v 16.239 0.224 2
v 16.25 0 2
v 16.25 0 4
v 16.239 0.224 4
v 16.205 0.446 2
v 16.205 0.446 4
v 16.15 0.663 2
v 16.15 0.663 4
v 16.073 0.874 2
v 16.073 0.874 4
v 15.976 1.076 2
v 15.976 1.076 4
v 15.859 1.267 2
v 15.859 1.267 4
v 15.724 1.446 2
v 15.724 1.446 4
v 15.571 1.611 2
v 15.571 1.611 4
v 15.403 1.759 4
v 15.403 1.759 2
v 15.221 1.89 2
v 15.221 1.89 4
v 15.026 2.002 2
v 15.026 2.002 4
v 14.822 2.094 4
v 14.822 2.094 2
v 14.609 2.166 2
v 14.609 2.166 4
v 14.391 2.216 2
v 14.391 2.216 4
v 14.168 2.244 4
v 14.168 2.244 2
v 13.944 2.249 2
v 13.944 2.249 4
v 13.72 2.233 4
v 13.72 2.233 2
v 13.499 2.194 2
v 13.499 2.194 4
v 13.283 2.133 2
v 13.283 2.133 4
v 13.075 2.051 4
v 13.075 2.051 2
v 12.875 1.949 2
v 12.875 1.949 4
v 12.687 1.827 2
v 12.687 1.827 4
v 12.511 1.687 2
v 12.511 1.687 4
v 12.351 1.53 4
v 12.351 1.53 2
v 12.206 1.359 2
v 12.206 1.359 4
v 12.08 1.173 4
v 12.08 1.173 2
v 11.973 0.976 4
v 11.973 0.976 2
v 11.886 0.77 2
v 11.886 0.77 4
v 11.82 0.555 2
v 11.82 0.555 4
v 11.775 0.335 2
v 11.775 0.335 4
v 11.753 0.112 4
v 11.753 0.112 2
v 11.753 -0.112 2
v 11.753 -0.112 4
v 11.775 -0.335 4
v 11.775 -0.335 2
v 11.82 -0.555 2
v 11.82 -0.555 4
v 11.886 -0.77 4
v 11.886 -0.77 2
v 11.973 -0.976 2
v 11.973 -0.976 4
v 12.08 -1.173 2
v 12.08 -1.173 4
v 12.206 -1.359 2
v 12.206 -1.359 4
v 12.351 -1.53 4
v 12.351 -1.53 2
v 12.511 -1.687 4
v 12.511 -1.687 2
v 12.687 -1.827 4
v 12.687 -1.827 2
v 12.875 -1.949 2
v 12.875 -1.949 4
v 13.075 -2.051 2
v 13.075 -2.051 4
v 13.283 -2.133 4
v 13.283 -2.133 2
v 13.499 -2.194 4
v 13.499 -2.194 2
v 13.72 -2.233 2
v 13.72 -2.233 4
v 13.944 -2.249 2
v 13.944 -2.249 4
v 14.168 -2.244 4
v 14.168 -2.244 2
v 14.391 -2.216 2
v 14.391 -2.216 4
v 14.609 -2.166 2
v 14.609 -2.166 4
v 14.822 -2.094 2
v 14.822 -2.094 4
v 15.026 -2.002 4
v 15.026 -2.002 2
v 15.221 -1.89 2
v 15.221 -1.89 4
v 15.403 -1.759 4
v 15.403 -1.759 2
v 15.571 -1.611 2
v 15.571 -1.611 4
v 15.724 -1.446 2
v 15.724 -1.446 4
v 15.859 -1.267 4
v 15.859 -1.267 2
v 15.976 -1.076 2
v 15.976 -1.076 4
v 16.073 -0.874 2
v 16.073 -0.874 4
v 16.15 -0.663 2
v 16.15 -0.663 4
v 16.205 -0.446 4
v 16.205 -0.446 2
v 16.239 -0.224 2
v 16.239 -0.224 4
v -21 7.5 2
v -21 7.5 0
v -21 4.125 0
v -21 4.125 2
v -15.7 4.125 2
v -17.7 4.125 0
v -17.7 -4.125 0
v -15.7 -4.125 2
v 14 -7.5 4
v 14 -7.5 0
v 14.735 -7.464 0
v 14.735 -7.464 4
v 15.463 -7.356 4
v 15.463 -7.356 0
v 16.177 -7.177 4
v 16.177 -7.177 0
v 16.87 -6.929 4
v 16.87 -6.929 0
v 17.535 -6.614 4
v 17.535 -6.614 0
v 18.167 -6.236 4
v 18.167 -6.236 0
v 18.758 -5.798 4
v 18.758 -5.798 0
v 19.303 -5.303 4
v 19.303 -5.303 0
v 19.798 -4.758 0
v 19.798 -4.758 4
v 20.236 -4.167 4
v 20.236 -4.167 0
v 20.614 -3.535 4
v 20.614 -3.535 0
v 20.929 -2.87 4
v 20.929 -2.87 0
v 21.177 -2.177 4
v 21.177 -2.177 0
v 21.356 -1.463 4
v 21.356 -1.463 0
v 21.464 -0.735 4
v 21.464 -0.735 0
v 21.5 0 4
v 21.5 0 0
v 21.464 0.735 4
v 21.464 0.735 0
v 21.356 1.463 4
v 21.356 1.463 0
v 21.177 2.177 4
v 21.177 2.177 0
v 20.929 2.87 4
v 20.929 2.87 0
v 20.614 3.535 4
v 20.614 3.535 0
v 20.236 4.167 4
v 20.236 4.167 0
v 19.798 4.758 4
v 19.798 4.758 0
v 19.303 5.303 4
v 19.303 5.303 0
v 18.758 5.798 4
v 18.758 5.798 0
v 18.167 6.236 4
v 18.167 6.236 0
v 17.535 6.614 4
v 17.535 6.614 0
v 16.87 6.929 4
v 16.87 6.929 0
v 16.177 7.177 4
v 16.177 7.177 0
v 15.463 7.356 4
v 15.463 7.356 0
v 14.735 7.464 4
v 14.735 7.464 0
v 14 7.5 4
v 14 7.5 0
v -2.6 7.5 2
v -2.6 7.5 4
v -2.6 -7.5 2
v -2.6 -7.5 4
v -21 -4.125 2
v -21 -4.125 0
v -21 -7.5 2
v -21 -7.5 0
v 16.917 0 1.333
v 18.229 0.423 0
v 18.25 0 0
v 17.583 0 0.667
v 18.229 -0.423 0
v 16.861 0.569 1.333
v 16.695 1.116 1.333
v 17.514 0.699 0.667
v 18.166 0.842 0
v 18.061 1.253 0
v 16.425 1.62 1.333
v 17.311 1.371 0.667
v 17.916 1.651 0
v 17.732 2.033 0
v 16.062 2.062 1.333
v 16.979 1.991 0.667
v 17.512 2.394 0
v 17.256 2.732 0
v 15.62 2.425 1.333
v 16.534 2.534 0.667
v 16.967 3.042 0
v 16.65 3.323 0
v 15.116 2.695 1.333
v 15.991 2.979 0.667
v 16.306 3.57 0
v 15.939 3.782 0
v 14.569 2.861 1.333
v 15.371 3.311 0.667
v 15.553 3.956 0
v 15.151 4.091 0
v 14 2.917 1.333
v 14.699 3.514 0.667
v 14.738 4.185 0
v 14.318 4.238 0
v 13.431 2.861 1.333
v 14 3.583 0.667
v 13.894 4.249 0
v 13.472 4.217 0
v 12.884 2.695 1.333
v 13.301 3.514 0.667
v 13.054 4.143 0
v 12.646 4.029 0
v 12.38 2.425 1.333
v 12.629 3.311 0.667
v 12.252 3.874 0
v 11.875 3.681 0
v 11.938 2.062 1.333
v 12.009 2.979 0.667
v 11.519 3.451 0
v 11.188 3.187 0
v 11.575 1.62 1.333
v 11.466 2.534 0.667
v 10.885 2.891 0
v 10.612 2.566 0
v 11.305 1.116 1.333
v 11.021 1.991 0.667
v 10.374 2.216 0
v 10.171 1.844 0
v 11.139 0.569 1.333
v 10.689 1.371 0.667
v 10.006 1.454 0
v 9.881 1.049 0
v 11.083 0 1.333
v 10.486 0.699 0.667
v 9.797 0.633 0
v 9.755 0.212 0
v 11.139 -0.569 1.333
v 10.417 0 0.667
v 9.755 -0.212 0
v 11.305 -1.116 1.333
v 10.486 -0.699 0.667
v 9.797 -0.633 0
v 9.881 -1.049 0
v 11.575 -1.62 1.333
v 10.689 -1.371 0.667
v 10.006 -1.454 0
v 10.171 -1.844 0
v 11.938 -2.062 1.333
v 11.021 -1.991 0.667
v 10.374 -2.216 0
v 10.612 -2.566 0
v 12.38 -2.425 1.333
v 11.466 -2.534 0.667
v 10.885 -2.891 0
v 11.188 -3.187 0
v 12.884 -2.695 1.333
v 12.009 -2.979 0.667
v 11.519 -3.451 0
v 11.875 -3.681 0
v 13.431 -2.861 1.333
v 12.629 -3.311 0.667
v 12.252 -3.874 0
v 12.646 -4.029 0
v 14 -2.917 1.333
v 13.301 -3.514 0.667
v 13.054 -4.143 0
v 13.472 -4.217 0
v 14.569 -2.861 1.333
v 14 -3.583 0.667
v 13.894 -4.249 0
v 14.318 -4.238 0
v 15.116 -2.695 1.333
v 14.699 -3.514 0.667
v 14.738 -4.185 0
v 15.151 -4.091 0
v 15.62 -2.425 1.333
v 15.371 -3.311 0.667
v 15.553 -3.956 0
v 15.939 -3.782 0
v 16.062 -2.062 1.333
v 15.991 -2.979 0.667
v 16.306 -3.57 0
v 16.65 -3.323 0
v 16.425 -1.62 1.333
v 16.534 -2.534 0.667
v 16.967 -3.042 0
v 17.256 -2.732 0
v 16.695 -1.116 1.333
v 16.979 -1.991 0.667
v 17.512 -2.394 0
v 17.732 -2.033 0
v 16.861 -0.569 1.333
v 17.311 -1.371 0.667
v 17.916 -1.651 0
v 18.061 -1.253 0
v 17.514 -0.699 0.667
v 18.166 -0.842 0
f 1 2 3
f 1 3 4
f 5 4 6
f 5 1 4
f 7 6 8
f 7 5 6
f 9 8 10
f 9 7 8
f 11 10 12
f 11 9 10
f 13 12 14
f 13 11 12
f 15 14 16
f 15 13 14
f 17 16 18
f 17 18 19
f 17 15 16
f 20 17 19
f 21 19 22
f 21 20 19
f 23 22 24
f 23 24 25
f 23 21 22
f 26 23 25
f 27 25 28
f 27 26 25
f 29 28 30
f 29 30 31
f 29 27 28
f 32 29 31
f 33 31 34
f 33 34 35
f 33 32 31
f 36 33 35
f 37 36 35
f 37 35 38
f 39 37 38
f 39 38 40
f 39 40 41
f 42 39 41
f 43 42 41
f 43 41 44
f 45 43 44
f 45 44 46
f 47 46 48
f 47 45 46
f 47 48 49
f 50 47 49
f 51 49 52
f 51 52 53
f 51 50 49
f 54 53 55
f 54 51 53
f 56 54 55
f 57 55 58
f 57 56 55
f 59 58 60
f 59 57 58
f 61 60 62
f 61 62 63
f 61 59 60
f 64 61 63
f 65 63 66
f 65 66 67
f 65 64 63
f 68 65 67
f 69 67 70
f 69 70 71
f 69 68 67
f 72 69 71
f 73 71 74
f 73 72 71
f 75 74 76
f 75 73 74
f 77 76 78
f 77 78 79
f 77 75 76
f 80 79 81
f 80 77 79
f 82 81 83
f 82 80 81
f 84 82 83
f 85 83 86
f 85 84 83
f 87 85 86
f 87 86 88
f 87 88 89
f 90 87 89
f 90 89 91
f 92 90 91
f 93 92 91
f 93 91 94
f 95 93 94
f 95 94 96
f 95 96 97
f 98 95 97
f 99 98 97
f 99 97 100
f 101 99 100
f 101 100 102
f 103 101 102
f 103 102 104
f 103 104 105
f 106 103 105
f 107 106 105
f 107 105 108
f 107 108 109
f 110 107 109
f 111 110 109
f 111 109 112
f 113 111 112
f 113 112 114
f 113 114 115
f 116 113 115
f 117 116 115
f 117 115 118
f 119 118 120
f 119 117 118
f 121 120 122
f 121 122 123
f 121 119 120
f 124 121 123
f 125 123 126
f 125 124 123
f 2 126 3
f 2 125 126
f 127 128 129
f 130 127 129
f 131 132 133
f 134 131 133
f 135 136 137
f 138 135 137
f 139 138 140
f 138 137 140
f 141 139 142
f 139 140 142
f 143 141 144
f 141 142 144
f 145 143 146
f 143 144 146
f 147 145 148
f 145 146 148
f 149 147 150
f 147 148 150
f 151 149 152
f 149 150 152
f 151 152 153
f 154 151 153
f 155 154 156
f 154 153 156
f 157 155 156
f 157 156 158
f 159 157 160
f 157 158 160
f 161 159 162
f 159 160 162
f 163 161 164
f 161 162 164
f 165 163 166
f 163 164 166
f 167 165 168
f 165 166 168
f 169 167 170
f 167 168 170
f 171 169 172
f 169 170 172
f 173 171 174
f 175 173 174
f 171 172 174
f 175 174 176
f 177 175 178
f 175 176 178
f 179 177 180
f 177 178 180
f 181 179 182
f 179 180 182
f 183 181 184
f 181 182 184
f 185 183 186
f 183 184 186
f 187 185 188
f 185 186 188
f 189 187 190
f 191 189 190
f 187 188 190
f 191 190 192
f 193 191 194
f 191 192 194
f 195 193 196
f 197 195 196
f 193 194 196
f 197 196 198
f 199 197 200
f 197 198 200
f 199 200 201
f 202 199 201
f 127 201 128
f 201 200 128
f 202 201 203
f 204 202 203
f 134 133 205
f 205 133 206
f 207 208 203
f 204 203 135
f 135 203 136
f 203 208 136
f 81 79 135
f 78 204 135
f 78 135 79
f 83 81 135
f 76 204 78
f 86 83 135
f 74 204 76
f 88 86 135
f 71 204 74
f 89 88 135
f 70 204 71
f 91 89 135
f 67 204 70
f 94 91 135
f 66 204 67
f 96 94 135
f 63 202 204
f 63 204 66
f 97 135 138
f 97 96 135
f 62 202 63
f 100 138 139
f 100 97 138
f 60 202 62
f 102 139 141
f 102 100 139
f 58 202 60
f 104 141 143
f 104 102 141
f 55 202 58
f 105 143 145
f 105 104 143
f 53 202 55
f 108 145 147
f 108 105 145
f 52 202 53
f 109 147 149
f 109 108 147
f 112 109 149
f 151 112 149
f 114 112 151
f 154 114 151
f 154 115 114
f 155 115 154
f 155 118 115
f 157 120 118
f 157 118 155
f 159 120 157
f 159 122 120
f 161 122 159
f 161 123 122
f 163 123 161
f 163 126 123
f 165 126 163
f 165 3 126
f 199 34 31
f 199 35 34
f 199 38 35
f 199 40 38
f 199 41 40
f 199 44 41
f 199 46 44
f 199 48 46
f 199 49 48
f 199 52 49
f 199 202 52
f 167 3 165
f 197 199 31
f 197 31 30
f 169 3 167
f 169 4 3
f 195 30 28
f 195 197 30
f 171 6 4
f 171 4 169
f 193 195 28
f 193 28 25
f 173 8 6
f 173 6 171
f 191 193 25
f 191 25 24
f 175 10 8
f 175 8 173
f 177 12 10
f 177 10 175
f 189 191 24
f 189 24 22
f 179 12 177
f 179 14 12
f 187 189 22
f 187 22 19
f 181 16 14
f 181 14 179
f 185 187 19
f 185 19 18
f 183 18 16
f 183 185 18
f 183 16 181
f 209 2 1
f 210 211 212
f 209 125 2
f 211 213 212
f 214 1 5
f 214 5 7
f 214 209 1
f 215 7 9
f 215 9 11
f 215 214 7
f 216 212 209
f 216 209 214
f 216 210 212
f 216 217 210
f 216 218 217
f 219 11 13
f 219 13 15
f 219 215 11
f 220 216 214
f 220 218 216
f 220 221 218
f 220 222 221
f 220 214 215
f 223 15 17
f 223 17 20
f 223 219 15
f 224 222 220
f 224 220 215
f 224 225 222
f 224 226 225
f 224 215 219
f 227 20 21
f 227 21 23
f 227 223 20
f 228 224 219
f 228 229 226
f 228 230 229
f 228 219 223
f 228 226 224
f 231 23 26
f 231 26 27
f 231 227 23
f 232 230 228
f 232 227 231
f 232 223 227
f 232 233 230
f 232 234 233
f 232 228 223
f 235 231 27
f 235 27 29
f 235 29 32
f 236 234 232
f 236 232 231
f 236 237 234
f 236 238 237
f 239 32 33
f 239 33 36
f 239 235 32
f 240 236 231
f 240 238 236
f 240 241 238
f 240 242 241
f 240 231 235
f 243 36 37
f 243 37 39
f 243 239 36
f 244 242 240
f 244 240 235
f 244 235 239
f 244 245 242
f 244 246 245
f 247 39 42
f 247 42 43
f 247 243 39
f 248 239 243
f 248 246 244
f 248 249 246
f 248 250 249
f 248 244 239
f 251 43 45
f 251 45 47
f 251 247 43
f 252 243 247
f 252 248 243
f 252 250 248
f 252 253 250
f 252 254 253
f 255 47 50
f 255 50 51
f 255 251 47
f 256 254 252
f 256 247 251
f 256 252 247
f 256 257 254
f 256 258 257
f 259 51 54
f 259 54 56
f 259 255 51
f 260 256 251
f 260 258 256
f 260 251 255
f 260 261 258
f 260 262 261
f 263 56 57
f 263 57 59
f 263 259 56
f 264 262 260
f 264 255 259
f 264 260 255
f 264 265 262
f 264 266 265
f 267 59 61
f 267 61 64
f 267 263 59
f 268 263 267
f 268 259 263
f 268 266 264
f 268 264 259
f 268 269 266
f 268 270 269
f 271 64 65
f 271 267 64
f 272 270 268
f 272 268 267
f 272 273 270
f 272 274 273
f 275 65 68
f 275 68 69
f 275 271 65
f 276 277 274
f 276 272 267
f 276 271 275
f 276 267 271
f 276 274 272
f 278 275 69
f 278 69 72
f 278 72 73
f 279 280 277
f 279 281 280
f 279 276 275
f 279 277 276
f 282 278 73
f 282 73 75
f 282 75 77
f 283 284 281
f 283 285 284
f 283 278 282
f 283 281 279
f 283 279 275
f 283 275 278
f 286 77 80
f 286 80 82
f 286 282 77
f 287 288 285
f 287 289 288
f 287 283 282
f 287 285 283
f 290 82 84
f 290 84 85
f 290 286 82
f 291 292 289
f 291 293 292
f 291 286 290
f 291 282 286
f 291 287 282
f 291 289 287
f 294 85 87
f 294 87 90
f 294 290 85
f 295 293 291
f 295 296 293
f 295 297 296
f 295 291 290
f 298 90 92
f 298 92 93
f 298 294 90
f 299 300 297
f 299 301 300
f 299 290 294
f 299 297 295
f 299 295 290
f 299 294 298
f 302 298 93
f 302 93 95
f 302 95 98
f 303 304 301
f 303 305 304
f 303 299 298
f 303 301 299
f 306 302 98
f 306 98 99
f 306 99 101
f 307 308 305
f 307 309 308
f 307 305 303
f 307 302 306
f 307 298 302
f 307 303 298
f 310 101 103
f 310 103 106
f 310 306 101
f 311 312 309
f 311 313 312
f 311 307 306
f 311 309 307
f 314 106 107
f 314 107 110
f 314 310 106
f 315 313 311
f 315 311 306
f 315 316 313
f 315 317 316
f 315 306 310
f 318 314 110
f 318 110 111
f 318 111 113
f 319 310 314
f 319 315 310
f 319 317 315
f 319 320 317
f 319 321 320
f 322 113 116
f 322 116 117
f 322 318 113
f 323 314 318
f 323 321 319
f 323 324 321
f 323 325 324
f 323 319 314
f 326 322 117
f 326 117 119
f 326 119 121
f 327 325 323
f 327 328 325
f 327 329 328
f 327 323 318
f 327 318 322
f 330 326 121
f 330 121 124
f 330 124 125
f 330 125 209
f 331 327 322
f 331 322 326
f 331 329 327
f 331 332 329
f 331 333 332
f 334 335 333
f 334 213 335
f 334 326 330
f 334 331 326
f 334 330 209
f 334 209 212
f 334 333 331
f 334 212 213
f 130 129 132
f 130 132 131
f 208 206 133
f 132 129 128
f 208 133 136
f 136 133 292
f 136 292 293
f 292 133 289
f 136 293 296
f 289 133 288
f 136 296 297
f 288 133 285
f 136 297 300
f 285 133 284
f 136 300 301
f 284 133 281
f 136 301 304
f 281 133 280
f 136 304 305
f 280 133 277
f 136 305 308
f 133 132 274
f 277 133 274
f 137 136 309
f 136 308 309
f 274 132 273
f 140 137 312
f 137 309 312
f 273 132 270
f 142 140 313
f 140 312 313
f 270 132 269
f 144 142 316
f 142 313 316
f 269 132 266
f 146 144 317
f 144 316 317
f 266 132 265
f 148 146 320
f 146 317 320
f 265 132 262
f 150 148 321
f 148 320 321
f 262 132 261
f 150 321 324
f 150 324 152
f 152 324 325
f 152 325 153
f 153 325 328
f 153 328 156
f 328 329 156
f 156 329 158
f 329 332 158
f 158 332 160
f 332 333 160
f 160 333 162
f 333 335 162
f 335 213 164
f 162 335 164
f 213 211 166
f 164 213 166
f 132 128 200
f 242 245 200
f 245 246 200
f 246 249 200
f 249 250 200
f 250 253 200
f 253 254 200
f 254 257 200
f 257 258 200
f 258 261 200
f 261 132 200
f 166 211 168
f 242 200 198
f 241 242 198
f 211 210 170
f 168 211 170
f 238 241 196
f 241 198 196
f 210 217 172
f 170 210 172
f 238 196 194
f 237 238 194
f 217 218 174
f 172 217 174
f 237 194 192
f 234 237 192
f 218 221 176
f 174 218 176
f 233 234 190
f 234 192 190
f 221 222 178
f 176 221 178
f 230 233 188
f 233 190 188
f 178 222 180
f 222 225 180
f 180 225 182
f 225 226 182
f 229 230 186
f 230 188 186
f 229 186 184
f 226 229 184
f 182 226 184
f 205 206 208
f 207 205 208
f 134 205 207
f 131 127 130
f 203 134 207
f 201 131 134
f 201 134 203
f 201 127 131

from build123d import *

# Parameters (mm, degrees)
F0_R     = 2.25
F1_DEPTH = 4
F2_DEPTH = 2
F3_SIZE  = 1.99999


# Not quite as in the source:
# - a fillet or chamfer is up to 0.001 mm smaller than in the source, because OpenCascade refuses the exact size


with BuildPart() as f1:
    # F0 (on Top) → F1 (new body)
    with BuildSketch(Plane.XY):
        with BuildLine():
            Line((14, 7.5), (-2.6, 7.5))
            Line((-2.6, 7.5), (-2.6, -7.5))
            Line((-2.6, -7.5), (14, -7.5))
            ThreePointArc((14, -7.5), (21.5, 0), (14, 7.5))
        make_face()
        with Locations((14, 0)):
            Circle(F0_R, mode=Mode.SUBTRACT)
    extrude(amount=F1_DEPTH)

    # F0 (on Top) → F2 (join)
    with BuildSketch(Plane.XY):
        Polygon((-2.6, 7.5), (-21, 7.5), (-21, 4.125), (-17.7, 4.125), (-17.7, -4.125), (-21, -4.125), (-21, -7.5), (-2.6, -7.5), align=None)
    extrude(amount=F2_DEPTH)

    # F3 (size 2 in the source; OpenCascade refuses exactly that, so slightly less here)
    f3_edges = [f1.edges().sort_by_distance(p)[0] for p in [
        (11.75, 0, 0),
        (-17.7, 0, 2),
    ]]
    chamfer(f3_edges, length=F3_SIZE)


solid = f1.part
